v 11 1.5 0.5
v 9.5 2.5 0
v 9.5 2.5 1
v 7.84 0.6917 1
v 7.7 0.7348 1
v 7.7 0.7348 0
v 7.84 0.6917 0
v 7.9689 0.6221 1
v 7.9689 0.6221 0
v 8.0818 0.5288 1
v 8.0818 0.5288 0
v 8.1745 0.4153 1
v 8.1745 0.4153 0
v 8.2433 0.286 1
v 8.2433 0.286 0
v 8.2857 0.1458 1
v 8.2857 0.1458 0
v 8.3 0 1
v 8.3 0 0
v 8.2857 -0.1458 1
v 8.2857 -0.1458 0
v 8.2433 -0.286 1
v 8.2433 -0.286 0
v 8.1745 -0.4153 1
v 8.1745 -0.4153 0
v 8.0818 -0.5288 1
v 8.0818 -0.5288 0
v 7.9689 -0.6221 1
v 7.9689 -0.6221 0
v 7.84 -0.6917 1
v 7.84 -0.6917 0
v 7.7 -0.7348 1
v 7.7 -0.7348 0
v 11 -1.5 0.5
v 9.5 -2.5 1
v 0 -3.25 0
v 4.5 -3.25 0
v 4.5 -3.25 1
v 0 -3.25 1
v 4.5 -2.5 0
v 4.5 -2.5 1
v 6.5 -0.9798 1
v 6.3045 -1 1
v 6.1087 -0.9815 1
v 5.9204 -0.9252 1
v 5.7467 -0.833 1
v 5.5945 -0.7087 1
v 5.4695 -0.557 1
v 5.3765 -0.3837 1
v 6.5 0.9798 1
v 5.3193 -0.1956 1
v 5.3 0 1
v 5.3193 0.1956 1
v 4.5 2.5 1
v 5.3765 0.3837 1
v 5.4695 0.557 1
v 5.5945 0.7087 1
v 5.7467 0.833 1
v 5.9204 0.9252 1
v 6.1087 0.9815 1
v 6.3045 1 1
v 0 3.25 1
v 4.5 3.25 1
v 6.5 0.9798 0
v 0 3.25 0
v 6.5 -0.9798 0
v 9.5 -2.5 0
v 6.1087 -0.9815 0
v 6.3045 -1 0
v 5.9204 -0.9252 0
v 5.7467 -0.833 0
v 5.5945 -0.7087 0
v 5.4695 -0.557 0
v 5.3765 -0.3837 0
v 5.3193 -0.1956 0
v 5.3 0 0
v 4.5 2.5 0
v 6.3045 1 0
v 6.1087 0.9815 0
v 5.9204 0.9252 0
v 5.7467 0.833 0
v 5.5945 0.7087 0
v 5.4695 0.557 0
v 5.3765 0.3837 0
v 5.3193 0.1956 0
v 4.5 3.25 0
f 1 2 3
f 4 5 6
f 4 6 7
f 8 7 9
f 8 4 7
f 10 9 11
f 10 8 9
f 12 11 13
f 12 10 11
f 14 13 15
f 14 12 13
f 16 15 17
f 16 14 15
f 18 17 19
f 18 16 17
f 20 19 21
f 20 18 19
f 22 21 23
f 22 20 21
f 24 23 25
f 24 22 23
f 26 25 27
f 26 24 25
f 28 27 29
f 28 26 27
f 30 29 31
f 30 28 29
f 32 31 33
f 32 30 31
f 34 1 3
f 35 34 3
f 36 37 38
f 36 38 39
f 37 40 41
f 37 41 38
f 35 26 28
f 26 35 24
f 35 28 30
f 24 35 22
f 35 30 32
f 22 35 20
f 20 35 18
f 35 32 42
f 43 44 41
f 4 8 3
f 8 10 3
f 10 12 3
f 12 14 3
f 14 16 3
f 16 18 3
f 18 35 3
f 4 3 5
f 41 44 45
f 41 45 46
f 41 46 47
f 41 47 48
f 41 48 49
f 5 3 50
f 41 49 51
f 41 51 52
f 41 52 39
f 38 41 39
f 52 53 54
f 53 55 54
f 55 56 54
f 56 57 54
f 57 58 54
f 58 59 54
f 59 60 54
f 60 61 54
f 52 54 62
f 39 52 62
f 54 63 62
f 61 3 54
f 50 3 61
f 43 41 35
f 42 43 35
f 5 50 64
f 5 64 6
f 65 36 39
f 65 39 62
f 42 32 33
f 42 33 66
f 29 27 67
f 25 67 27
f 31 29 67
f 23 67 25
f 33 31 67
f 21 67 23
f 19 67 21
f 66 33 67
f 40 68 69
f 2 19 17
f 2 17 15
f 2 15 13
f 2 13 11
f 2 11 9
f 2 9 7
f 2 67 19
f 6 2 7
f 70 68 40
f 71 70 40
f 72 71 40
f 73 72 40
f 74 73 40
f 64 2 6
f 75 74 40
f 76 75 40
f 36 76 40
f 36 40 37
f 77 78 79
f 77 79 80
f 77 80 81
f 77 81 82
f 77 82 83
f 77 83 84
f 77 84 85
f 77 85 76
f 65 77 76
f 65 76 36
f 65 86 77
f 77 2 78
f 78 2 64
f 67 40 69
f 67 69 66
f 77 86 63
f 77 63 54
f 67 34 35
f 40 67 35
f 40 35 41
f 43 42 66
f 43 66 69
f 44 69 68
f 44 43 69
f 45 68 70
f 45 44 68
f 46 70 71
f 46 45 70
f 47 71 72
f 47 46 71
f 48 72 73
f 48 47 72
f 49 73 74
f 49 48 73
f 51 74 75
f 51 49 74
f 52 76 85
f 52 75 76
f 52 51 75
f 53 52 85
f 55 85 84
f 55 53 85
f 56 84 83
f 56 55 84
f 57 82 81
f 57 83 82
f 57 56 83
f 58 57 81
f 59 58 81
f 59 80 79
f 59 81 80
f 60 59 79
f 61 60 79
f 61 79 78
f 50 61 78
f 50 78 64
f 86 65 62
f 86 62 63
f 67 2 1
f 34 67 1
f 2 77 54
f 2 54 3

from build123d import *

# Parameters (mm, degrees)
DODANIE_WYCI_GNI_CIE1_DEPTH = 1
WYTNIJ_WYCI_GNI_CIE1_REACH  = 3
WYTNIJ_WYCI_GNI_CIE2_REACH  = 7.75


with BuildPart() as part:
    # Szkic1 → Dodanie-wyciągnięcie1 (new body)
    with BuildSketch(Plane.XY):
        Polygon((0, -3.25), (0, 3.25), (4.5, 3.25), (4.5, 2.5), (9.5, 2.5), (11, 1.5), (11, -1.5), (9.5, -2.5), (4.5, -2.5), (4.5, -3.25), align=None)
    extrude(amount=DODANIE_WYCI_GNI_CIE1_DEPTH)

    # Szkic2 → Wytnij-wyciągnięcie1 (cut, up to next)
    with BuildSketch(Plane.XY.offset(1), mode=Mode.PRIVATE) as wytnij_wyci_gni_cie1_sk1:
        with BuildLine():
            Line((6.5, 0.979795897), (7.7, 0.734846923))
            ThreePointArc((7.7, 0.734846923), (8.3, 0), (7.7, -0.734846923))
            Line((7.7, -0.734846923), (6.5, -0.979795897))
            ThreePointArc((6.5, -0.979795897), (5.3, 0), (6.5, 0.979795897))
        make_face()
    wytnij_wyci_gni_cie1_tool1 = extrude(wytnij_wyci_gni_cie1_sk1.sketch, amount=-WYTNIJ_WYCI_GNI_CIE1_REACH, mode=Mode.PRIVATE) & part.part
    add(wytnij_wyci_gni_cie1_tool1.solids().sort_by_distance((6.737463, 0, 1))[0], mode=Mode.SUBTRACT)

    # Szkic3 → Wytnij-wyciągnięcie2 (cut, up to next)
    with BuildSketch(Plane(origin=(0, 2.5, 0), x_dir=(1, 0, 0), z_dir=(0, 1, 0)), mode=Mode.PRIVATE) as wytnij_wyci_gni_cie2_sk1:
        Polygon((11, -1), (11, -0.5), (9.5, -1), align=None)
    wytnij_wyci_gni_cie2_tool1 = extrude(wytnij_wyci_gni_cie2_sk1.sketch, amount=-WYTNIJ_WYCI_GNI_CIE2_REACH, mode=Mode.PRIVATE) & part.part
    add(wytnij_wyci_gni_cie2_tool1.solids().sort_by_distance((10.5, 2.5, 0.833333))[0], mode=Mode.SUBTRACT)
    # Szkic3 → Wytnij-wyciągnięcie2 (cut, up to next)
    with BuildSketch(Plane(origin=(0, 2.5, 0), x_dir=(1, 0, 0), z_dir=(0, 1, 0)), mode=Mode.PRIVATE) as wytnij_wyci_gni_cie2_sk2:
        Polygon((9.5, 0), (11, -0.5), (11, 0), align=None)
    wytnij_wyci_gni_cie2_tool2 = extrude(wytnij_wyci_gni_cie2_sk2.sketch, amount=-WYTNIJ_WYCI_GNI_CIE2_REACH, mode=Mode.PRIVATE) & part.part
    add(wytnij_wyci_gni_cie2_tool2.solids().sort_by_distance((10.5, 2.5, 0.166667))[0], mode=Mode.SUBTRACT)


solid = part.part
